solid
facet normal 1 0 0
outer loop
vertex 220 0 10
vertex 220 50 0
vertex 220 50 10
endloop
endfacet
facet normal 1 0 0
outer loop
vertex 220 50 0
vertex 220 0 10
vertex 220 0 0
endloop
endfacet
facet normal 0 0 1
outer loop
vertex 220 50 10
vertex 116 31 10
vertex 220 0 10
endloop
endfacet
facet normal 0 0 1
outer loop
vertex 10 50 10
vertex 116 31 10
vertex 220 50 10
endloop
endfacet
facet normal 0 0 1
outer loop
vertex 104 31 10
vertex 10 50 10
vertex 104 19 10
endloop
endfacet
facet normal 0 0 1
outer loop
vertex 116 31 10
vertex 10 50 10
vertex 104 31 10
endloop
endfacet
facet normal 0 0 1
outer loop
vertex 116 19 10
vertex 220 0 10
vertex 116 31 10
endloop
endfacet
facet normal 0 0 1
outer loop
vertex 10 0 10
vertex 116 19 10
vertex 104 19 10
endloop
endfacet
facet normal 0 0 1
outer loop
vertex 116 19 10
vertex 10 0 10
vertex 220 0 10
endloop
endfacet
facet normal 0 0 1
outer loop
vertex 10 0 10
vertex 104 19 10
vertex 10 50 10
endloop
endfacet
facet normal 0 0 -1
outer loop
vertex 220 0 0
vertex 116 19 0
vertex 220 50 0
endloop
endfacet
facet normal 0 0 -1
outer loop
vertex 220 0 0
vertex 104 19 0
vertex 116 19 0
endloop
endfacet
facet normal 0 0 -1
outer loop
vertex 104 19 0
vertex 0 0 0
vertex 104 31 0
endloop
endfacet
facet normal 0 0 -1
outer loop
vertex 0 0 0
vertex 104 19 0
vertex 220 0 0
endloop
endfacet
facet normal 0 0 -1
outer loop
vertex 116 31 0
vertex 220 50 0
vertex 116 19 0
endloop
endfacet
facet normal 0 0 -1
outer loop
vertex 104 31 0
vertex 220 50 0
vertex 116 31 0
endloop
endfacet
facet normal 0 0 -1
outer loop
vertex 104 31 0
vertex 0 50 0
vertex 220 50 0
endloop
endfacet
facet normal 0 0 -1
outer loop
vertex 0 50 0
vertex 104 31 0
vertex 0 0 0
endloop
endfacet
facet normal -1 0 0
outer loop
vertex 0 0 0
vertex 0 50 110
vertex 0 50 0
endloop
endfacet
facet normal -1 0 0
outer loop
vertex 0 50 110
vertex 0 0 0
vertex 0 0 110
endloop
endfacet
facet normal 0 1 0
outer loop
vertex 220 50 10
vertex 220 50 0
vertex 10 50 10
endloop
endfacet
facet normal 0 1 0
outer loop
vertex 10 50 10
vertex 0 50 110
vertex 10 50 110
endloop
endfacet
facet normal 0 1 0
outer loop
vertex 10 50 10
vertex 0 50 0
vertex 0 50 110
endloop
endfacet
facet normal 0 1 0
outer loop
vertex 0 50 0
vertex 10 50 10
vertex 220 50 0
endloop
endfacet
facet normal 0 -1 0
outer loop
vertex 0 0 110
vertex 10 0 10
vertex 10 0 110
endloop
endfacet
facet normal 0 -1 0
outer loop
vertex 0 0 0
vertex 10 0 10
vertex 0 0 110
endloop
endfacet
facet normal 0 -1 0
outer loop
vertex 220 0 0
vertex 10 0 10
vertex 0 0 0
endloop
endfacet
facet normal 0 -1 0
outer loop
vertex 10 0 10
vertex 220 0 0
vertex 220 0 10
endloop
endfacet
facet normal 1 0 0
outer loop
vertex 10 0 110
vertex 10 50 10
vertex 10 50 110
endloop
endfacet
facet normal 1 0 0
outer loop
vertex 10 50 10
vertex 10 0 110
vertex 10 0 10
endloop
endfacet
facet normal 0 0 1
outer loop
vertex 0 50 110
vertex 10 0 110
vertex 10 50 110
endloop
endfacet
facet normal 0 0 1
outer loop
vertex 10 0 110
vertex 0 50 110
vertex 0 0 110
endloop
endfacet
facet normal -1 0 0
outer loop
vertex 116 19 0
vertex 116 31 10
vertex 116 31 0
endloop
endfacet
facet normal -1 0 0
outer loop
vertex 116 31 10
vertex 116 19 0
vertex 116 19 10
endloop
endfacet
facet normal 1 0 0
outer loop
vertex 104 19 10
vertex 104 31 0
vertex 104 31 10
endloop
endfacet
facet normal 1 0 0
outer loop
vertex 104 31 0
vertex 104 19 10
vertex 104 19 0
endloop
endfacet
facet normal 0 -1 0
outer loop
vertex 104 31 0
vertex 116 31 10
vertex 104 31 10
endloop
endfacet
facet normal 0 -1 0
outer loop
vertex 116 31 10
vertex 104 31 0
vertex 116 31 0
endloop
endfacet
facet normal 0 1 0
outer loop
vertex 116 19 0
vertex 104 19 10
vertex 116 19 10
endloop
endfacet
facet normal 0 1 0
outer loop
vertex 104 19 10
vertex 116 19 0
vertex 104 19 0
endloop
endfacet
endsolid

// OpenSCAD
$fn = 32;

// ----------------------------------------------------------------------
// Gantry bracket: 200-250 mm L bracket
// ----------------------------------------------------------------------

// --- parameters (mm) ---
base_l = 220;             // base arm length, X
arm_w = 50;               // arm width, Y
thick = 10;               // arm thickness
up_h = 100;               // vertical arm height, Z
slot_w = 12;              // adjustment slot width in the base

total_h = up_h + thick;  // overall height

difference() {
  union() {
    cube([base_l, arm_w, thick]);
    cube([thick, arm_w, total_h]);
  }
  translate([base_l / 2 - slot_w / 2, arm_w / 2 - slot_w / 2, -1])
    cube([slot_w, slot_w, thick + 2]);
}
